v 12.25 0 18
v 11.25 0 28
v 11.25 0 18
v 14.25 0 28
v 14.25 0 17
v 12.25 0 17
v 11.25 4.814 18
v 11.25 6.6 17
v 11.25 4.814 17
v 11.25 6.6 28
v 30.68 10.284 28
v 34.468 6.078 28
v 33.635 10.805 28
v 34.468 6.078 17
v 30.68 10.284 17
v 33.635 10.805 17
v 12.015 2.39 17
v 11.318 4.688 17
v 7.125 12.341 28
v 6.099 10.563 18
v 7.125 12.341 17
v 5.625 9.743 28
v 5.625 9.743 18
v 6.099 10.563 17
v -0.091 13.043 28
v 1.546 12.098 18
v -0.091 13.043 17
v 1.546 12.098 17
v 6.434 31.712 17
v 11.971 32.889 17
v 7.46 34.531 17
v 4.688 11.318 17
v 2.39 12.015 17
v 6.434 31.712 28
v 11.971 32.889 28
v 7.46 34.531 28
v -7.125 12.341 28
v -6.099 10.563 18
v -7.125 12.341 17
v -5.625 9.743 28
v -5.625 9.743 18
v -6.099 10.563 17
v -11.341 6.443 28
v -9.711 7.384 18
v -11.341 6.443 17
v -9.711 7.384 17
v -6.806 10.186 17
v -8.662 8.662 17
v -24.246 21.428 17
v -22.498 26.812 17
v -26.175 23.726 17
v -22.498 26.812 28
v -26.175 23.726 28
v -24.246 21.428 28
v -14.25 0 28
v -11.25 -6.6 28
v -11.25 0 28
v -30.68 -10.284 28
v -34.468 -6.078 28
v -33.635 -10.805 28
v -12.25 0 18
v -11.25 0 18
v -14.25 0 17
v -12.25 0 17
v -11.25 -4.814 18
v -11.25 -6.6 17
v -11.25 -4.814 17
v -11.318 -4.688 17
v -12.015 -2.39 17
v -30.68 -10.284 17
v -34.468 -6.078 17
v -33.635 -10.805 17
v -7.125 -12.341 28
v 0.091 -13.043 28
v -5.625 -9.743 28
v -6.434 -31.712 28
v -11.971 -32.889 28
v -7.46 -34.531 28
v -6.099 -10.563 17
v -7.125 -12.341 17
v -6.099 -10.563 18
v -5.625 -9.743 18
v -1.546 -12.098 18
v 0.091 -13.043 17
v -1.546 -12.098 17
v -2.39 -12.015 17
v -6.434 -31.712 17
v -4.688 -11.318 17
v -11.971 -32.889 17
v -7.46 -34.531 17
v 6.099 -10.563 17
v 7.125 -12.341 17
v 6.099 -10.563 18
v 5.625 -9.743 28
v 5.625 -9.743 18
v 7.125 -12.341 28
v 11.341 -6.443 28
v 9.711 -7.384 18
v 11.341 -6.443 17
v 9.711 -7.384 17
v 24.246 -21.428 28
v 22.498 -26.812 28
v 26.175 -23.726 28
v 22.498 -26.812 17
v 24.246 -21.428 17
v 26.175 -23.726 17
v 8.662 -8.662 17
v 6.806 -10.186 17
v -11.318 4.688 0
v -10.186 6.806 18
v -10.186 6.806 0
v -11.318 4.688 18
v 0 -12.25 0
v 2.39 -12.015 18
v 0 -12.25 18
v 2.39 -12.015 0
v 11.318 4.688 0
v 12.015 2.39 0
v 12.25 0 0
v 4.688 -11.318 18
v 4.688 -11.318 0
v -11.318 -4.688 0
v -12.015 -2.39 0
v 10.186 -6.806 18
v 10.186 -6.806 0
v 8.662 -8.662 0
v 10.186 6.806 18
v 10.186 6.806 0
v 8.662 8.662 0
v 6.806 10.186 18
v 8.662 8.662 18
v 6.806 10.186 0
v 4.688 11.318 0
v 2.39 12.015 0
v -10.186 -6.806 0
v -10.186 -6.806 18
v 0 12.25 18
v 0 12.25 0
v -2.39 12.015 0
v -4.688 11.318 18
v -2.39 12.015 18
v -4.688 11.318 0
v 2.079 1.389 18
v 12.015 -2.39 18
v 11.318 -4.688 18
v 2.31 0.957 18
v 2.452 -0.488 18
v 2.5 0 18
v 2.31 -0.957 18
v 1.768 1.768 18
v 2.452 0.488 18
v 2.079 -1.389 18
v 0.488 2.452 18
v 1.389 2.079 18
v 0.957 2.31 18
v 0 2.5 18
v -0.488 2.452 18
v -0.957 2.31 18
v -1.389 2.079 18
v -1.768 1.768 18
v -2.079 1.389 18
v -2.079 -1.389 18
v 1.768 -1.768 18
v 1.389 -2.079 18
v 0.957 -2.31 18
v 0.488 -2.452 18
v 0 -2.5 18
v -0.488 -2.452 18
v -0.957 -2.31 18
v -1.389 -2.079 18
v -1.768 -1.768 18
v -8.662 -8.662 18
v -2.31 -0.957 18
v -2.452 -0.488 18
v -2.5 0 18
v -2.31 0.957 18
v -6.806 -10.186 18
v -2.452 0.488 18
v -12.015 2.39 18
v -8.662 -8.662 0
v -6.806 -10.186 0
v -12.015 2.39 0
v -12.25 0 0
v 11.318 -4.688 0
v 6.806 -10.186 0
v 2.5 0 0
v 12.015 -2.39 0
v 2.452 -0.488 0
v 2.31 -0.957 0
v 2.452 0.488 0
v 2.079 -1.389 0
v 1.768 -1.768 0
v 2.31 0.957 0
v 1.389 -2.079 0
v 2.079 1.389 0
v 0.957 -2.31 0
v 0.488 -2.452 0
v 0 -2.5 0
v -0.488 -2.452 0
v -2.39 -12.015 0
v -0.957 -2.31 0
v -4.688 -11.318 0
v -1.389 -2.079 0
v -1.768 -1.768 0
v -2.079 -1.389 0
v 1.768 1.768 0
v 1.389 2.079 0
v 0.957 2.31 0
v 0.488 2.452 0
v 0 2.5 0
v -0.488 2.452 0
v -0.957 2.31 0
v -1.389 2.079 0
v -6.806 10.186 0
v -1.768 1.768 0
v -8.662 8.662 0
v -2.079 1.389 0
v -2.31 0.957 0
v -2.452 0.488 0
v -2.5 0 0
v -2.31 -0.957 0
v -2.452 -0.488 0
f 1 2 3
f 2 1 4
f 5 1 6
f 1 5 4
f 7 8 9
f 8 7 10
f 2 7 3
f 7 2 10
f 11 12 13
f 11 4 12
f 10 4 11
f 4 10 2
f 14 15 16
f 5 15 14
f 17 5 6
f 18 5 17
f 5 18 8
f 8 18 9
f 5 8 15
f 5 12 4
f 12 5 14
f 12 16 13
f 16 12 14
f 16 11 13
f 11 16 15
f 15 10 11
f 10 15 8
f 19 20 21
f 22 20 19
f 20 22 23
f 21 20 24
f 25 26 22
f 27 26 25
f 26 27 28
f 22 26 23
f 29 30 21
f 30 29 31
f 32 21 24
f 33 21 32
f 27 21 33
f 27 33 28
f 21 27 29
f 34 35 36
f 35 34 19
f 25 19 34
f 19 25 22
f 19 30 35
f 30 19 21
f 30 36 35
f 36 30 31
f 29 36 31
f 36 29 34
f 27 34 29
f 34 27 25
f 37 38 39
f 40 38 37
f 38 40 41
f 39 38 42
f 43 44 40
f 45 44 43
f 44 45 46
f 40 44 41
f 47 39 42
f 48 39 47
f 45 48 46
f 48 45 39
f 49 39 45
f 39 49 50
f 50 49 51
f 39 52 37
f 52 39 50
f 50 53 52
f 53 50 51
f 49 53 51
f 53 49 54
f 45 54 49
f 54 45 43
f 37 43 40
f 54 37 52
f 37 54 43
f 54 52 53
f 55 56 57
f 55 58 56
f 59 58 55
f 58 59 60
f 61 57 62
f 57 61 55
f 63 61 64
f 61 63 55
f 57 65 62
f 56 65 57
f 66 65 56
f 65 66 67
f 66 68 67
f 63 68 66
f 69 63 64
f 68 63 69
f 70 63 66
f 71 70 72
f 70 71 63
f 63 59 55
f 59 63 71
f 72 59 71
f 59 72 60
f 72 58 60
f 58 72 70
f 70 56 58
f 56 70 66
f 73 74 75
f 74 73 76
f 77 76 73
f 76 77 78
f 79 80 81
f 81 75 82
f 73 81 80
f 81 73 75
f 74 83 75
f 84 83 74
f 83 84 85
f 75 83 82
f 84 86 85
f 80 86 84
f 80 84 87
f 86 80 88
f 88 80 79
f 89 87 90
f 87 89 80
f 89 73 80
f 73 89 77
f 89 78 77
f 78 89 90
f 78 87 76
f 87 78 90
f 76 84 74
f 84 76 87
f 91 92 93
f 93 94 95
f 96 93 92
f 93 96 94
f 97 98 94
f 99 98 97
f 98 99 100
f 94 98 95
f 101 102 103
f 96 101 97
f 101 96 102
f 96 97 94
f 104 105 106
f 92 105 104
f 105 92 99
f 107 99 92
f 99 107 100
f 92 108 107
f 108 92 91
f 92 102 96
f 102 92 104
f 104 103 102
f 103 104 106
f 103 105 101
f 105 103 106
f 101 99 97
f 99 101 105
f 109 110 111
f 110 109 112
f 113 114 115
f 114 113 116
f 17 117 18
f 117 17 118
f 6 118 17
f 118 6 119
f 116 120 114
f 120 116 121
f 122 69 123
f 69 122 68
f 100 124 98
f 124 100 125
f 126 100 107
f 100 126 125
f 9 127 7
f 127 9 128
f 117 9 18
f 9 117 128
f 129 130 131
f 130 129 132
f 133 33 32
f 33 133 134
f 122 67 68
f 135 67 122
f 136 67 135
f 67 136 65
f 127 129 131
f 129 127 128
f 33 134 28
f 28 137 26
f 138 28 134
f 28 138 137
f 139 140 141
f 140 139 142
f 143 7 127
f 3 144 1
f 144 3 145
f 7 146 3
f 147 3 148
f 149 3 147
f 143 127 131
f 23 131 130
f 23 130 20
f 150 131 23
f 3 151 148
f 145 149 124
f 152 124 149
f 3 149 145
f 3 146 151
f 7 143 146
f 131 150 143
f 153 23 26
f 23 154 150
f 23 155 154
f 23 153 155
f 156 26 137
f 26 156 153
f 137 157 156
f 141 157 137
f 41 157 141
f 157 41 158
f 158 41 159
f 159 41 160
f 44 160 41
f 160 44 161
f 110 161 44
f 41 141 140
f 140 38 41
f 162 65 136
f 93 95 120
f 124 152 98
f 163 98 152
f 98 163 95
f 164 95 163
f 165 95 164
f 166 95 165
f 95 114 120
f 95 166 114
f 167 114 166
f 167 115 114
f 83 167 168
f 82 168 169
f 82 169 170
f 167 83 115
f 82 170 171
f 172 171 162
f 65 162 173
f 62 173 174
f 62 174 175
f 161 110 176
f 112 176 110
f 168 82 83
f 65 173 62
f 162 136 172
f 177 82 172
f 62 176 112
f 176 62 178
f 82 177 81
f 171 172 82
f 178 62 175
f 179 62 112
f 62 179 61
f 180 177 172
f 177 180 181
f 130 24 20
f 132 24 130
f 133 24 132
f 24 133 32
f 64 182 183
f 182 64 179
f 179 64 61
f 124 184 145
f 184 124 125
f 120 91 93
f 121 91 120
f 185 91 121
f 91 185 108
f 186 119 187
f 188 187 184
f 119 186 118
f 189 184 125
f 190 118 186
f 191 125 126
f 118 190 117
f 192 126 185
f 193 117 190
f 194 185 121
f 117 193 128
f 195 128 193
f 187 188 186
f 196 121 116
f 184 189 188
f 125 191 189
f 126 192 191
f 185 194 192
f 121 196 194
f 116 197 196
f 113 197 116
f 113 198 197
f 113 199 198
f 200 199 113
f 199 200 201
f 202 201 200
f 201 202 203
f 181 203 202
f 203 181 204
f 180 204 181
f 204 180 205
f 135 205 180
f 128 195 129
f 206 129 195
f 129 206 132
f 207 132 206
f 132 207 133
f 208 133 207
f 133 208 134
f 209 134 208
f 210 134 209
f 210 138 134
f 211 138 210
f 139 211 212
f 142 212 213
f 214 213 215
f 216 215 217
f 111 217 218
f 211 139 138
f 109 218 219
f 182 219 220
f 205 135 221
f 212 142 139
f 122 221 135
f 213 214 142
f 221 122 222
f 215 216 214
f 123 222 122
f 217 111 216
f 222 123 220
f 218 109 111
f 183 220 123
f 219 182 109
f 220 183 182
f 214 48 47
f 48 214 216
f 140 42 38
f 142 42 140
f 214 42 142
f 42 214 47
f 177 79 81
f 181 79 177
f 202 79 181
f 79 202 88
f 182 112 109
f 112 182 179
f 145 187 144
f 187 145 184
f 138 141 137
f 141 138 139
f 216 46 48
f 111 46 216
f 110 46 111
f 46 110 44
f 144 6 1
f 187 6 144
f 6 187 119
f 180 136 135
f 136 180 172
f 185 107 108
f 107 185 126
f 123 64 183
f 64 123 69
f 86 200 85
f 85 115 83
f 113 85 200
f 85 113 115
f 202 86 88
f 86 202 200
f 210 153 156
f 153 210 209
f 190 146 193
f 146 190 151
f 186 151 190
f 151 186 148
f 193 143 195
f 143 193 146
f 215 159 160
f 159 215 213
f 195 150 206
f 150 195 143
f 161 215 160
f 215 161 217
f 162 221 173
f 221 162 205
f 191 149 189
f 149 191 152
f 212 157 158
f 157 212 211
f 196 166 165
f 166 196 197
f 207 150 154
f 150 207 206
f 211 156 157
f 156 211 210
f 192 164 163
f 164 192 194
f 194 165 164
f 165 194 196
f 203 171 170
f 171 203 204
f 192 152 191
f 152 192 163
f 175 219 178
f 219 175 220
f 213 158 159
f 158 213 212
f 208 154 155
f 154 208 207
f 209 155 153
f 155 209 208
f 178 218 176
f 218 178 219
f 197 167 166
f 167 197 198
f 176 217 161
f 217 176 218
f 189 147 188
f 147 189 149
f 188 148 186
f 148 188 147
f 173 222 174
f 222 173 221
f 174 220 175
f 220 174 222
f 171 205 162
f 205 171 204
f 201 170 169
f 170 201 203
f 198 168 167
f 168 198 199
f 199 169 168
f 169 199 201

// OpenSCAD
$fn = 32;

// ----------------------------------------------------------------------
// Impeller: 70 mm, 6 blades, 28 mm tall
// ----------------------------------------------------------------------

// --- parameters (mm) ---
center_d = 24.5;          // hub diameter
center_h = 18;            // hub height
wheel_d = 70;             // outer diameter over the blades
blade_count = 6;          // number of blades
blade_t = 3;              // blade thickness
blade_h = 10;             // blade height
blade_in_r = 11.25;       // blade root radius
blade_out_r = 32;         // blade tip radius
sweep = 10;               // blade sweep, degrees
bore_d = 5;               // shaft bore

module hub() {
  cylinder(h = center_h, d = center_d);
}

module blade() {
  /* blade swept between two boxes: hull of the root and the tip section */
  hull() {
    translate([blade_in_r, 0, center_h - 1])
      cube([blade_t, blade_t * 2.2, blade_h + 1], center = false);
    rotate([0, 0, sweep])
      translate([blade_out_r, 0, center_h - 1])
        cube([blade_t, blade_t * 1.6, blade_h + 1], center = false);
  }
}

module blades() {
  for (i = [0 : blade_count - 1])
    rotate([0, 0, i * 360 / blade_count]) blade();
}

difference() {
  union() {
    hub();
    blades();
  }
  translate([0, 0, -1]) cylinder(h = center_h + blade_h + 0 + 3, d = bore_d);
}
